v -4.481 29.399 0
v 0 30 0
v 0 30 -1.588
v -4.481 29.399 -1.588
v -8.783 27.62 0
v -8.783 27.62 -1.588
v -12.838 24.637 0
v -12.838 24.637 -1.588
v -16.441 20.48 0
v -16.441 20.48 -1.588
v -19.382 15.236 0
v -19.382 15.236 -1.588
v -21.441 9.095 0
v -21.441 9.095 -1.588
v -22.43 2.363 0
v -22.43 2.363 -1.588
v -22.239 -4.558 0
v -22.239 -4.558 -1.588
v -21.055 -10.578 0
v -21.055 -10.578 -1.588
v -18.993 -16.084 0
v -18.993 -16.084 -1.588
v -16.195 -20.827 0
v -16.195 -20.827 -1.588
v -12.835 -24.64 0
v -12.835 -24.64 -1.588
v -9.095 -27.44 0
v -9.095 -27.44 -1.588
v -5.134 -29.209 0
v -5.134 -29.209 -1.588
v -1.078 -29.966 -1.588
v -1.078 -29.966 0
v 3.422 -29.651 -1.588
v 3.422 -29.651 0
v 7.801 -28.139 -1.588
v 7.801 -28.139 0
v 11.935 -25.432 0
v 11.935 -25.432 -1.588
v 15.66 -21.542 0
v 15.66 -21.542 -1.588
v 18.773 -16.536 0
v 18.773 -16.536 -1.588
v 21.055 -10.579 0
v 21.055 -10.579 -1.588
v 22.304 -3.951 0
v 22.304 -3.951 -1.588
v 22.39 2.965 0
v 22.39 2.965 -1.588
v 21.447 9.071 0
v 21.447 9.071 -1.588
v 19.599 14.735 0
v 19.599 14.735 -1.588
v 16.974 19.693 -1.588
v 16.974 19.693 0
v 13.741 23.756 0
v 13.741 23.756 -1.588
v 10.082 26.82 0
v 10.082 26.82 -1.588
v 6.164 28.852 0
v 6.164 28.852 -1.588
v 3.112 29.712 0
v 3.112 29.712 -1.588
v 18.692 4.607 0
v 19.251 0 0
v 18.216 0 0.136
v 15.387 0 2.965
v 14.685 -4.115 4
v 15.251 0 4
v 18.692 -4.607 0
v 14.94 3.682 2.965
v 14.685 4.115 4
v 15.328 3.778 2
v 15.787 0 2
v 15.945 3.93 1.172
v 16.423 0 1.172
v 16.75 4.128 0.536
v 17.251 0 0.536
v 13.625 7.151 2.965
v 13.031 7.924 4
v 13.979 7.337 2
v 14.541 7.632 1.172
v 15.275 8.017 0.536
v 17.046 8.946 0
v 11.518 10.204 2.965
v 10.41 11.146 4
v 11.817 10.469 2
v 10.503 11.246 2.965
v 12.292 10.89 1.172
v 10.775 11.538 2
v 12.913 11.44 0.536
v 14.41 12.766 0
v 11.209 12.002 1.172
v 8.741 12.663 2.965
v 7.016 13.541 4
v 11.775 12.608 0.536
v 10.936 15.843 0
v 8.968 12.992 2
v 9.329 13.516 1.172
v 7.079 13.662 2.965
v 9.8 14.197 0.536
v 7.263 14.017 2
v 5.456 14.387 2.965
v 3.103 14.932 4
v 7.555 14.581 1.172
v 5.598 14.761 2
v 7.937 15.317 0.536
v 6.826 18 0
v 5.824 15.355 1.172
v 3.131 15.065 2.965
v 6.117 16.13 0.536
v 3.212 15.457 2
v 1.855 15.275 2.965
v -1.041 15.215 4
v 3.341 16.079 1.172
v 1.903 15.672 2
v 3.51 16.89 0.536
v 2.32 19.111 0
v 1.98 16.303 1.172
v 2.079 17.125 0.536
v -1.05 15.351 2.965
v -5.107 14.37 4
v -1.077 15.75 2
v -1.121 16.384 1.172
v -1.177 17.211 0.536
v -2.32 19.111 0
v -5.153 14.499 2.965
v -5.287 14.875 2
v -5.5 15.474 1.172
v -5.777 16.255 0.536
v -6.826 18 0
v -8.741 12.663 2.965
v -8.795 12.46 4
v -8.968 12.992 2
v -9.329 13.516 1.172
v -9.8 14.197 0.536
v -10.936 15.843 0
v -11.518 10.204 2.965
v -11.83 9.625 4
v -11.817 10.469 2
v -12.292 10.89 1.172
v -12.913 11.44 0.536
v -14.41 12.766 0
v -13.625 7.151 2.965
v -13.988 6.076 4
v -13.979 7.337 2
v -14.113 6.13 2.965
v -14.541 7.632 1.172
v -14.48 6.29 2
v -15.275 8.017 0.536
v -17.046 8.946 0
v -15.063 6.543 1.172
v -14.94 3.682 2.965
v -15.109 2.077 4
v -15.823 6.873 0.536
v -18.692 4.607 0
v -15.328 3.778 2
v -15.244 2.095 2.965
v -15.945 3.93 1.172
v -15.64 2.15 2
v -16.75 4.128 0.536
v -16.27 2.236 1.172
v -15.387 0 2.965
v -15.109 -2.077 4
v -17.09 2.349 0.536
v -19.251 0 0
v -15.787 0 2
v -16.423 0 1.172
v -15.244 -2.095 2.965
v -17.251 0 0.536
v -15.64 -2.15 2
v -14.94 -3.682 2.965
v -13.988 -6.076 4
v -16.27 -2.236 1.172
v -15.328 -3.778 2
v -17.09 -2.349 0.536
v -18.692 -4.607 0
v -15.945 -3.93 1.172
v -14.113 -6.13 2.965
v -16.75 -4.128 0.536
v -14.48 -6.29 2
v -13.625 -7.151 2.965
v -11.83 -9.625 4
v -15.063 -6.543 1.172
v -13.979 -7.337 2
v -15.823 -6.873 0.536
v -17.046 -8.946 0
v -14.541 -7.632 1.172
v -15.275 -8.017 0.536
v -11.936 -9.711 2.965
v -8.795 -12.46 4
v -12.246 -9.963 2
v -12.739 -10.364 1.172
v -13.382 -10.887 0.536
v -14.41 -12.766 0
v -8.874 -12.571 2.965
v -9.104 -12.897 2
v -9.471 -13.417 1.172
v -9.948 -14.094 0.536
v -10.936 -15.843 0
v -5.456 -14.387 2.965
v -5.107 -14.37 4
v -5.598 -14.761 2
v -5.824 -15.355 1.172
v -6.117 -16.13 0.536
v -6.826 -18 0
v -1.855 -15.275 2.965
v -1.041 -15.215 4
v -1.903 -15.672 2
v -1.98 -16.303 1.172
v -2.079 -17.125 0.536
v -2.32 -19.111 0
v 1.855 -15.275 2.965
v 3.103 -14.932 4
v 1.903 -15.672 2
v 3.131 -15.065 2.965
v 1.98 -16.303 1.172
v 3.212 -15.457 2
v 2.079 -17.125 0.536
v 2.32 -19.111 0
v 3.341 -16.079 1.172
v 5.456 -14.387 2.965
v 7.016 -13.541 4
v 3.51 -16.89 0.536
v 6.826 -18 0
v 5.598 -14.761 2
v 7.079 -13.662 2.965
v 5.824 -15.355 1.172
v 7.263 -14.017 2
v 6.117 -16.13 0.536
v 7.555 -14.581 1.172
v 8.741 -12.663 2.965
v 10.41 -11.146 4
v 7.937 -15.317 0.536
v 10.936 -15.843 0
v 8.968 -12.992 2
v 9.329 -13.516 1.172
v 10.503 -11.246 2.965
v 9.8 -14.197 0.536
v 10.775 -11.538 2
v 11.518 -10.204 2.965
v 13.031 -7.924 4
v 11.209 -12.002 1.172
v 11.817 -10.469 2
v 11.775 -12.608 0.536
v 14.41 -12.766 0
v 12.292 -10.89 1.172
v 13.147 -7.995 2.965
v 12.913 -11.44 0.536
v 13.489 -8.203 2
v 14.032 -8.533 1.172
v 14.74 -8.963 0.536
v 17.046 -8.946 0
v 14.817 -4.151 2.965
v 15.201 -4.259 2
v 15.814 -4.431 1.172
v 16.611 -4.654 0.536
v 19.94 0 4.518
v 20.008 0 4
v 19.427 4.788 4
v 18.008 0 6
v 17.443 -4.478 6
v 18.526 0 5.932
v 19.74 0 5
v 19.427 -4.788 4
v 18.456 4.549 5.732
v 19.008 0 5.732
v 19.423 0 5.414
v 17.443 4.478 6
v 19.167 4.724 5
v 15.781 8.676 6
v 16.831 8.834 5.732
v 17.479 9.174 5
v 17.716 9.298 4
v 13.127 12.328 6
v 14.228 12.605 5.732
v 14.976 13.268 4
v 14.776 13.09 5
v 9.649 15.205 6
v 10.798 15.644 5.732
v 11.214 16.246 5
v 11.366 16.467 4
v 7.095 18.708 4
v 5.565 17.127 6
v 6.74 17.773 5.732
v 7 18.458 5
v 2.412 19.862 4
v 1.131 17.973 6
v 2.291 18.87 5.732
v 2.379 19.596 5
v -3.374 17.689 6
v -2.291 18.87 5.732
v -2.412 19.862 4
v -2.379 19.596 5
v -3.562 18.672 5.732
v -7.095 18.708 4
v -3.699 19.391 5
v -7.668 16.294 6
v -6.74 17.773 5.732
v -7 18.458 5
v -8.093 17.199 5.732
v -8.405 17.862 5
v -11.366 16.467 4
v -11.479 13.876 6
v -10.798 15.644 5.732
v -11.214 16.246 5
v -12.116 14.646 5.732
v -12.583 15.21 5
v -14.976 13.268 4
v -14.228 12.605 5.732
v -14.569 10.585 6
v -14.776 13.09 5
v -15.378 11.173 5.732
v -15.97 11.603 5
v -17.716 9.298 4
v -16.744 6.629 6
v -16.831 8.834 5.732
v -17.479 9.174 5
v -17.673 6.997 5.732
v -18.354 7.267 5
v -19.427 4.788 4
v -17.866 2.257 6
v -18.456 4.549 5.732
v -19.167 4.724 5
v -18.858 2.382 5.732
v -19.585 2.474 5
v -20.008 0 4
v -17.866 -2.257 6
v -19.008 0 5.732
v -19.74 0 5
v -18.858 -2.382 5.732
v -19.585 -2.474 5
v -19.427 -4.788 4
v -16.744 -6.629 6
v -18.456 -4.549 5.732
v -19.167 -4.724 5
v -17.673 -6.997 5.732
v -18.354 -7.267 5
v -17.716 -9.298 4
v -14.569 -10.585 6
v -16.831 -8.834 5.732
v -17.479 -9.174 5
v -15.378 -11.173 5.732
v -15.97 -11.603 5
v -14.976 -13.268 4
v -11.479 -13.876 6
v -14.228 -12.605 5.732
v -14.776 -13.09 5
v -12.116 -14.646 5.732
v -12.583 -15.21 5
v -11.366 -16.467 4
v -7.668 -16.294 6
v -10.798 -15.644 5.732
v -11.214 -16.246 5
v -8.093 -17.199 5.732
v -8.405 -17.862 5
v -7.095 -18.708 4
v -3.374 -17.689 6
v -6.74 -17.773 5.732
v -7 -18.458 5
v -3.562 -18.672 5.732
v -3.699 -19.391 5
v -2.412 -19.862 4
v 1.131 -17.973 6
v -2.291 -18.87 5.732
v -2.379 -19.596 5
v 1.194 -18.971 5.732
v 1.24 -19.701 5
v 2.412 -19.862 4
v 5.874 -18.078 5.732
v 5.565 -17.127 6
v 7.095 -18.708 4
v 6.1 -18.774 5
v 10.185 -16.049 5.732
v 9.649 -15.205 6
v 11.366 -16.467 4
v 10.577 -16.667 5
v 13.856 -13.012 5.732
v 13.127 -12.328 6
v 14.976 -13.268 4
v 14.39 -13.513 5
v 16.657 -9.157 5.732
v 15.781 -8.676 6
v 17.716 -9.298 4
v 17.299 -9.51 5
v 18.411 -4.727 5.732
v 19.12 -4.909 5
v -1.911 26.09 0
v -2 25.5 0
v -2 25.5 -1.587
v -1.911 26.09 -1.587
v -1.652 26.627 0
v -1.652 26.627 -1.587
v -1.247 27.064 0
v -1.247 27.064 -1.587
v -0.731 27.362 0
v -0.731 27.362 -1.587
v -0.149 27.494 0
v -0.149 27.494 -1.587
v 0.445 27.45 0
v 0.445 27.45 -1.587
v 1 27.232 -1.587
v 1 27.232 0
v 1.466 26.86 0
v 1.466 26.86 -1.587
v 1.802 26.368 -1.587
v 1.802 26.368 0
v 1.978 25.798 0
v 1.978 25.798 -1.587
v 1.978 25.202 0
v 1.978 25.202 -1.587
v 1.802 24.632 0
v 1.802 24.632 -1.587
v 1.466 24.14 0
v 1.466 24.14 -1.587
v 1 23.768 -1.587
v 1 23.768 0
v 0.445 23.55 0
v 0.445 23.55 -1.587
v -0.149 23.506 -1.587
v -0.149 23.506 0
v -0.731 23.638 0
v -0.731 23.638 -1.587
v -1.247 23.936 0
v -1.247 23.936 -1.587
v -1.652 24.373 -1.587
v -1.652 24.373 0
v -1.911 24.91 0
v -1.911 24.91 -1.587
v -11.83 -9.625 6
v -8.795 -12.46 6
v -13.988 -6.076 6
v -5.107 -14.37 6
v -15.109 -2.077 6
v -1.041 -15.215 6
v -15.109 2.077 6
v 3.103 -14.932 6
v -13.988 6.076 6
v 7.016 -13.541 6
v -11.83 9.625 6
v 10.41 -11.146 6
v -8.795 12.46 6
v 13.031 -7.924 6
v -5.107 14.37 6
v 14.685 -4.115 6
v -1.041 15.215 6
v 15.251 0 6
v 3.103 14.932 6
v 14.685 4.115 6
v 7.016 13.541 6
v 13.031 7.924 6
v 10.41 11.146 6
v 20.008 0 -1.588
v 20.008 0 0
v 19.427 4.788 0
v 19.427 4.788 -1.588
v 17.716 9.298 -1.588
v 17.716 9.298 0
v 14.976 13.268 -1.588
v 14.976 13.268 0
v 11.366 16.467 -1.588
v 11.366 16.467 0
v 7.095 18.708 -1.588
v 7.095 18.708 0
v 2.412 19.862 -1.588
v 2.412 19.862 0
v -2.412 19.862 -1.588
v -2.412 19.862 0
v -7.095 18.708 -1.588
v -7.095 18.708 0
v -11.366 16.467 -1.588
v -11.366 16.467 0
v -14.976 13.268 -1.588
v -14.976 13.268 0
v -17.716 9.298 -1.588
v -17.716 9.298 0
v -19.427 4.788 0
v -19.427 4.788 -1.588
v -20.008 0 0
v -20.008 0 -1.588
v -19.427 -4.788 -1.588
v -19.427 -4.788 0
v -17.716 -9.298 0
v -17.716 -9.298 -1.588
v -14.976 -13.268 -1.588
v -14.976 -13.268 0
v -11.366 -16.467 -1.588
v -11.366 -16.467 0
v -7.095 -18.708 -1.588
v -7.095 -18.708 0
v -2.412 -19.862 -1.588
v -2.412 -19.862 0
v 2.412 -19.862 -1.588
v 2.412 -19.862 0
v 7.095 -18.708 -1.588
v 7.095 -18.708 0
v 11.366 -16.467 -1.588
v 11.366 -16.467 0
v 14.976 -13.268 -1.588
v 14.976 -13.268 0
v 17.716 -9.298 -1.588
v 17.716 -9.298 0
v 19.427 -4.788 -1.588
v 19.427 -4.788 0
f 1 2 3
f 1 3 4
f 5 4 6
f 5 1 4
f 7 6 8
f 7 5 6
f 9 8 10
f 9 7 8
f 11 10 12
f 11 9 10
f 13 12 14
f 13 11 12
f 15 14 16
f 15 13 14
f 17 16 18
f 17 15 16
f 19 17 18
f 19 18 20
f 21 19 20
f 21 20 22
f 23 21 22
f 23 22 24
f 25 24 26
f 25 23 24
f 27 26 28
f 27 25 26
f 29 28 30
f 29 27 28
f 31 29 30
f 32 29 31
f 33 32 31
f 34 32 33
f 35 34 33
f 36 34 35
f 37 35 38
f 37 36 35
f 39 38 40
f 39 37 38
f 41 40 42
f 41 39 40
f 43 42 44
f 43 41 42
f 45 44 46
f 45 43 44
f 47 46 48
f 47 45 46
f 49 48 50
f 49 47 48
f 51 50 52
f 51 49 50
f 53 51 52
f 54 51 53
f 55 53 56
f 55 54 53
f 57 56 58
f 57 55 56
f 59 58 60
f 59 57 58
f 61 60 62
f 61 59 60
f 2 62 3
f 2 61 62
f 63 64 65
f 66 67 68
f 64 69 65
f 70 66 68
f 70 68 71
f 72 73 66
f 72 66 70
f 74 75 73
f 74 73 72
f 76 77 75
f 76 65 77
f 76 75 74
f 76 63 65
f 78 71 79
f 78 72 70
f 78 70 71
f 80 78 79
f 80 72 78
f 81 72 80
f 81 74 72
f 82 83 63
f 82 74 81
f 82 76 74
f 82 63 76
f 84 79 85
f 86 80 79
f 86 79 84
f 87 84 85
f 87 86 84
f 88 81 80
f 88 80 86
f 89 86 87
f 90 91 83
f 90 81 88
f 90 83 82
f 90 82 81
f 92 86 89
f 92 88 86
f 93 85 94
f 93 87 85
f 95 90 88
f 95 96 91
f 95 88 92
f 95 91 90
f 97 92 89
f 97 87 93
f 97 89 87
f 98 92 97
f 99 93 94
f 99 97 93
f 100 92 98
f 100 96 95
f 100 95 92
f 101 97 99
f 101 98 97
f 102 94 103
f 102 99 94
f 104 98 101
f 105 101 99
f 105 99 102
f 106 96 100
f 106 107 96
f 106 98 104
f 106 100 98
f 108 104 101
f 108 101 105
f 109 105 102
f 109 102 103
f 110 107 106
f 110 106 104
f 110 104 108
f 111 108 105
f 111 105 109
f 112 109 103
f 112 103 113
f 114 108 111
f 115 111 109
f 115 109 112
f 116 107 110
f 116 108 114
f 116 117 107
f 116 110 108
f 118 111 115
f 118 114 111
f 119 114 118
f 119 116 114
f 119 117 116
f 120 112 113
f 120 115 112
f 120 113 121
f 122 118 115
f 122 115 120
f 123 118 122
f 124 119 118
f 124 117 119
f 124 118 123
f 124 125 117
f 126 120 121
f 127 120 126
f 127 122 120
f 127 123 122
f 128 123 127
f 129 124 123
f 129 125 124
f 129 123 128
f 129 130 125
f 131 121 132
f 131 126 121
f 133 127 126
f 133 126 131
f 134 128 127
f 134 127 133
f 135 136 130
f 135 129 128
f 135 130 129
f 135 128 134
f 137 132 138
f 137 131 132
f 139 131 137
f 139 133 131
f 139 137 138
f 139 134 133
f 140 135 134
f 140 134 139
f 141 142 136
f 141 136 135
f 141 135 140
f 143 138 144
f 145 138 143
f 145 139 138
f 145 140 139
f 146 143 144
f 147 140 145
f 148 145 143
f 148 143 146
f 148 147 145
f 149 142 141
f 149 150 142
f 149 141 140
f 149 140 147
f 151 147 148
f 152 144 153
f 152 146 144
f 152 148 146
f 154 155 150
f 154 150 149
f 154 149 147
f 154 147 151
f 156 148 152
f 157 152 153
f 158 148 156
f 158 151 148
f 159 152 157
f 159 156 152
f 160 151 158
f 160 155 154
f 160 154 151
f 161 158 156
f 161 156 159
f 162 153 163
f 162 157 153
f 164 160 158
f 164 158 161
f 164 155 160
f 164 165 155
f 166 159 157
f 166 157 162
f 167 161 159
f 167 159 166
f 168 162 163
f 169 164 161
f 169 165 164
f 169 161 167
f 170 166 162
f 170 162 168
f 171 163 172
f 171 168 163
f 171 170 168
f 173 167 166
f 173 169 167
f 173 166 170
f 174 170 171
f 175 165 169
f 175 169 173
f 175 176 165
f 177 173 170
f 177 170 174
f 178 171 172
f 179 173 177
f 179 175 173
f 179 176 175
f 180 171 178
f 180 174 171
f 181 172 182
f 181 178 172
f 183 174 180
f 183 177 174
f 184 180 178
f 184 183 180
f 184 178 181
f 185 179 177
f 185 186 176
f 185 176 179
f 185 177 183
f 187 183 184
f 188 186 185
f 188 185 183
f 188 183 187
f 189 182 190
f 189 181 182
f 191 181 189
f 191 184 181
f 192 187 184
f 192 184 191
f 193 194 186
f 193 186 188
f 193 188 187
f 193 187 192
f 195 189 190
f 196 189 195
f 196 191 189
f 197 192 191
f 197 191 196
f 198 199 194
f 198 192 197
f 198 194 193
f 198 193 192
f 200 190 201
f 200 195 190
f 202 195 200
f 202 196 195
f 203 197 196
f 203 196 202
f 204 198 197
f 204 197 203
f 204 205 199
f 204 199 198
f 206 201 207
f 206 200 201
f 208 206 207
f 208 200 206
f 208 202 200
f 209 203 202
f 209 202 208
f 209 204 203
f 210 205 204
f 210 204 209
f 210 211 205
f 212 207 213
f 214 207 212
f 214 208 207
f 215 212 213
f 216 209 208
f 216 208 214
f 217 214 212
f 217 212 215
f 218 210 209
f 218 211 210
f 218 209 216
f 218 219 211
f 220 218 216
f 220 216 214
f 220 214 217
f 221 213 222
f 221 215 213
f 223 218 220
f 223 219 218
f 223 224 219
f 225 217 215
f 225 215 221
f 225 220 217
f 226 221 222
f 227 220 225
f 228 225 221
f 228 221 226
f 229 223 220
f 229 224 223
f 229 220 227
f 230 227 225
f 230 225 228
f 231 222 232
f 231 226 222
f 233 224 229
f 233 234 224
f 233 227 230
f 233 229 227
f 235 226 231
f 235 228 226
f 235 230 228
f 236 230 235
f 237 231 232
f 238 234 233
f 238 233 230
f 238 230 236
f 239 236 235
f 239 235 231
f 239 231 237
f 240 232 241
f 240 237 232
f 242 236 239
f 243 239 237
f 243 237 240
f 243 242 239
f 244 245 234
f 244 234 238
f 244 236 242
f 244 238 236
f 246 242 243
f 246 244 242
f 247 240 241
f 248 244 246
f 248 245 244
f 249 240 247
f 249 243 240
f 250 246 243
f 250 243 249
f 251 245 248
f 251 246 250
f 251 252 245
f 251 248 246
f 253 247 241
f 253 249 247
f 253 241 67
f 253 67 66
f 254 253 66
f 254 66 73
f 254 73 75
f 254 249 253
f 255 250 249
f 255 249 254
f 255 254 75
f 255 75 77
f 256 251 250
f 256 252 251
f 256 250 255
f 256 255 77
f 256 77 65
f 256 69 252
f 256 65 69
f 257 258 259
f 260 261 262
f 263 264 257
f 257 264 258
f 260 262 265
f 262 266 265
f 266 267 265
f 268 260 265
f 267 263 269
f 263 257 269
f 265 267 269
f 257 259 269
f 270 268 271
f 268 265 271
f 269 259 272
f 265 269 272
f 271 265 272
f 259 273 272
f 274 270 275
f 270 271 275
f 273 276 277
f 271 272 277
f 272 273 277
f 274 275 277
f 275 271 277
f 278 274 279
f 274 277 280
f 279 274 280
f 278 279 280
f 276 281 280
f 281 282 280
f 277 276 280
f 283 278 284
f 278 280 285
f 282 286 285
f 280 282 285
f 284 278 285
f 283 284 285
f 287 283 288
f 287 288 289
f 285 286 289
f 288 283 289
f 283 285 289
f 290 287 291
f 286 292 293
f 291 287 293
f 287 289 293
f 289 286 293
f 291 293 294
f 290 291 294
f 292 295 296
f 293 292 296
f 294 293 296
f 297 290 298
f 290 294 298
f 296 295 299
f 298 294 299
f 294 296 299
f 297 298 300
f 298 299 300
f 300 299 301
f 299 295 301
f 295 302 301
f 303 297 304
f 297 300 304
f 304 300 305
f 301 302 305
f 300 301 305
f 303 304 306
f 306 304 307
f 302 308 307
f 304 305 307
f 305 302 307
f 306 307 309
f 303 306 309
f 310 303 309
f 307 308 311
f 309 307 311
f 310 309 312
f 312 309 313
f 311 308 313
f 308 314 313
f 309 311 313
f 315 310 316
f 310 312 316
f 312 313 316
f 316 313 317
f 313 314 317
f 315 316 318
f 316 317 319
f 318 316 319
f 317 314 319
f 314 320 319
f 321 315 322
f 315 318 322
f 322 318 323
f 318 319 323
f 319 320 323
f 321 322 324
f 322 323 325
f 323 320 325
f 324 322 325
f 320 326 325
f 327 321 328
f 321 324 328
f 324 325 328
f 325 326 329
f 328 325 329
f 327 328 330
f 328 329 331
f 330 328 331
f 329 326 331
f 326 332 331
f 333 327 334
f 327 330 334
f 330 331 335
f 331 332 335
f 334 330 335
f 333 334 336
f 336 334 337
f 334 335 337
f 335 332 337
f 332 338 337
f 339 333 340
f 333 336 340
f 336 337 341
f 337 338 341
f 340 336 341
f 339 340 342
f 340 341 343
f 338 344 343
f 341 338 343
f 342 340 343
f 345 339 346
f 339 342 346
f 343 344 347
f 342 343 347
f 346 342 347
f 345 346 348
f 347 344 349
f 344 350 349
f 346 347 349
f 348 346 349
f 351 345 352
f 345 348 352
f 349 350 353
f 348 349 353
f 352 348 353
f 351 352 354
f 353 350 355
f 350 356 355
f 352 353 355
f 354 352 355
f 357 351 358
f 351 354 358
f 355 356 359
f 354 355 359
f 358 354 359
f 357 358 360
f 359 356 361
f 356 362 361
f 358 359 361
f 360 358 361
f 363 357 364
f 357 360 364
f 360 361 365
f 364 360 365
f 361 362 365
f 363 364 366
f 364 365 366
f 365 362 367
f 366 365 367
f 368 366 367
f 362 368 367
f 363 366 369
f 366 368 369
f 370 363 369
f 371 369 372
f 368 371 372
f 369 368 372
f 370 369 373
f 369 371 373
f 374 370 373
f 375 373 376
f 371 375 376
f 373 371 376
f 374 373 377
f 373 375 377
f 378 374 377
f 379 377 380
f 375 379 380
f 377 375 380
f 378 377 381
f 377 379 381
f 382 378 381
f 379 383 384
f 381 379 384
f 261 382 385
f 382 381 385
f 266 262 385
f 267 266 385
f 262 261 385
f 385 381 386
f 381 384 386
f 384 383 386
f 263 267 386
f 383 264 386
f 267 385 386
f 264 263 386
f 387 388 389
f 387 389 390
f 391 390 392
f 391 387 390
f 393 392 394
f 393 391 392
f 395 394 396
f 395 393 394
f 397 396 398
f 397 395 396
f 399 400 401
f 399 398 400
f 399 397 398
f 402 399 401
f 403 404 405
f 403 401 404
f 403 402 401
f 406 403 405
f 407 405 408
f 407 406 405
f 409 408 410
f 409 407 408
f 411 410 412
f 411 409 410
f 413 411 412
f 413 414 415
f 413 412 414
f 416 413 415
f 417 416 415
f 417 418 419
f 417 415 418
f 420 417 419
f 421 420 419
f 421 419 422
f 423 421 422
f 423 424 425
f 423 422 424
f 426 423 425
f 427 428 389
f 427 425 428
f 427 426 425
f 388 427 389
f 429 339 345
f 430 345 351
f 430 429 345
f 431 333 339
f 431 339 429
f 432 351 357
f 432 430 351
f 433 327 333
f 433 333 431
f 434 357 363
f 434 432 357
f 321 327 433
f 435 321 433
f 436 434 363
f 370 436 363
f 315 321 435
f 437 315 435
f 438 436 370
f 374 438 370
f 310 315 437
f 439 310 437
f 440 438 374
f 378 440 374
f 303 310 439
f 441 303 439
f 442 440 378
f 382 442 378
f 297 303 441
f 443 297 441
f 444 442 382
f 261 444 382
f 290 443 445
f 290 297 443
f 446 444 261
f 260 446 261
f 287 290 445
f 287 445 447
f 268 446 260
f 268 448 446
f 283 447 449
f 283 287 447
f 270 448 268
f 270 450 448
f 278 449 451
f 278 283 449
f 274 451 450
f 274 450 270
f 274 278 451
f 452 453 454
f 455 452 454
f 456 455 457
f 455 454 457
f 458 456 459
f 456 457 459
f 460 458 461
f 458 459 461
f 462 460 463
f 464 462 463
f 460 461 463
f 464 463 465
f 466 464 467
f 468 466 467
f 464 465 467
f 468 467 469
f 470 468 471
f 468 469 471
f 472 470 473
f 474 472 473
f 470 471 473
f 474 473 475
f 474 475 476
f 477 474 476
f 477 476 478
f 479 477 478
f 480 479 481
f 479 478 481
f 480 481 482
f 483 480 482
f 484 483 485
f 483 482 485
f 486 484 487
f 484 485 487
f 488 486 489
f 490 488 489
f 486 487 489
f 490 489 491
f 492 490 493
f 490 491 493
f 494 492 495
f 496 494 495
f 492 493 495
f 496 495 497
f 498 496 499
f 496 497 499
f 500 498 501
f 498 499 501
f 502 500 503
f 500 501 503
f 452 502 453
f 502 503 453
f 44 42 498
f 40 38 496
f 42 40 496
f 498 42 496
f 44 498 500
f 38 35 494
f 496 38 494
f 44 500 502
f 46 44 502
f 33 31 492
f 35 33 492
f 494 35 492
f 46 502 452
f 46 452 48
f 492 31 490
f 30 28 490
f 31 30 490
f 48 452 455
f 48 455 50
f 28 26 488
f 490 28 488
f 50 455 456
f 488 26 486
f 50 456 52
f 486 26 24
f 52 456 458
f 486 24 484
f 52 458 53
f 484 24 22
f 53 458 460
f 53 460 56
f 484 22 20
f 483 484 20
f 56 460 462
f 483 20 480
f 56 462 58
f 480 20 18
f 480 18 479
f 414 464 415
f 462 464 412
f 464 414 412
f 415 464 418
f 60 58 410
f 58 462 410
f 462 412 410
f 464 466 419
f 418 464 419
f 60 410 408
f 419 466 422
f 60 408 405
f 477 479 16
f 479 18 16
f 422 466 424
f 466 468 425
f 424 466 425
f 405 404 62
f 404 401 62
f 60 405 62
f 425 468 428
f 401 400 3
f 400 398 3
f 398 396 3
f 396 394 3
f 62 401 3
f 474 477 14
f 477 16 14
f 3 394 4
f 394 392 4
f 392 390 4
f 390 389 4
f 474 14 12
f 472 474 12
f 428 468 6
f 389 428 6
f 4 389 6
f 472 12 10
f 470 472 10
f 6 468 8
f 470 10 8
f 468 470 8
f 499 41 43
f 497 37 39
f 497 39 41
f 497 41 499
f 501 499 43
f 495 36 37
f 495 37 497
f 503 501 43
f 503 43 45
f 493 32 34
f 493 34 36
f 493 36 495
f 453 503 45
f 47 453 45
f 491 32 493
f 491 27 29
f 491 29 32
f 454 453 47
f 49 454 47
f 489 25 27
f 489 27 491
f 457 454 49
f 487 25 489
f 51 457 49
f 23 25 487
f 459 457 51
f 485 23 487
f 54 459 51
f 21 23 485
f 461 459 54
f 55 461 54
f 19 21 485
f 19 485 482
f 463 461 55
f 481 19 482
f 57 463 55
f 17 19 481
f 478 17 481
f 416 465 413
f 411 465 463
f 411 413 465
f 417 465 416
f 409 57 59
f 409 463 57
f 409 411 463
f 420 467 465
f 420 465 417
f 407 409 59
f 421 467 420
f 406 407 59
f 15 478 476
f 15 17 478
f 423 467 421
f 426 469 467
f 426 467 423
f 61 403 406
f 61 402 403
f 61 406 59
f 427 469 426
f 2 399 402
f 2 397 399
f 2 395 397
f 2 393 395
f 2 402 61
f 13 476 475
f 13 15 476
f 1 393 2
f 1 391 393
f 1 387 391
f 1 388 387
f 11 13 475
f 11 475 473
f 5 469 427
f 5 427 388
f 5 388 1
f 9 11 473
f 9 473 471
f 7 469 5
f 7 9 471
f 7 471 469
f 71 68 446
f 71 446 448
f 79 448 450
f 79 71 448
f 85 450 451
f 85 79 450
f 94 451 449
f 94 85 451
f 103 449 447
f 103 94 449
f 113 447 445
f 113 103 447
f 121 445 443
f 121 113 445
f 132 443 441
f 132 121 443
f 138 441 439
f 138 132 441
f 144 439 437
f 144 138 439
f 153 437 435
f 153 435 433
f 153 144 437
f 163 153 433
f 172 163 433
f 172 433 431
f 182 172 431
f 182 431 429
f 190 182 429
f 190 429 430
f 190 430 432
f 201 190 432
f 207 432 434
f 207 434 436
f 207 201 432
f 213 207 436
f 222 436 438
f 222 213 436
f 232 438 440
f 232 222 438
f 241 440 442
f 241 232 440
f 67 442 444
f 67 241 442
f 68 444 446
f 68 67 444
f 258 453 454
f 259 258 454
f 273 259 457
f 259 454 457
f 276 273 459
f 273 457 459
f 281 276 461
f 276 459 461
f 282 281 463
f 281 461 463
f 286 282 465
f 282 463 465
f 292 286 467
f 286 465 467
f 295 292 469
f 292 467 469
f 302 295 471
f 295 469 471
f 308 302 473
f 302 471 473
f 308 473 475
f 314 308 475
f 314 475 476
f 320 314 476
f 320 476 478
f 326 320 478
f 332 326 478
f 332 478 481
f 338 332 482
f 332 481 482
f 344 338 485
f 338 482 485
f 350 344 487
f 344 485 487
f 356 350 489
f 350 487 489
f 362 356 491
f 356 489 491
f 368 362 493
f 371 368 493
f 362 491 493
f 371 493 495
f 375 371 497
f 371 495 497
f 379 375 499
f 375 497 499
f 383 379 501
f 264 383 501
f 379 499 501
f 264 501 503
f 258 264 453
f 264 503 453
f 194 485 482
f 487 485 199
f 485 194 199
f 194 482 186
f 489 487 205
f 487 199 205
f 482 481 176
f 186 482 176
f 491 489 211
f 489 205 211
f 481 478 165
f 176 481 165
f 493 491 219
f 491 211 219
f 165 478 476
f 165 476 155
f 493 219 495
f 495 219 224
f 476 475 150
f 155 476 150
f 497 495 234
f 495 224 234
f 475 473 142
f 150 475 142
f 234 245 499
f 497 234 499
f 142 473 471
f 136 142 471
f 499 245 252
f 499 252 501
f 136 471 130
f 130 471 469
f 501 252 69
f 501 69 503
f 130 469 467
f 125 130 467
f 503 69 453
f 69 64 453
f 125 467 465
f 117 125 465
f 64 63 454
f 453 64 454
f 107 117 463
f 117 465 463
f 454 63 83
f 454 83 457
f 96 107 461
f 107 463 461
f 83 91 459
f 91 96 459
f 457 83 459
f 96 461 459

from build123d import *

# Parameters (mm, degrees)
SKETCH1_RX              = 30
SKETCH1_RY              = 22.5
SKETCH1_R               = 20.008311299
BOSS_EXTRUDE1_DEPTH     = 1.5875
SKETCH1_3_R             = 20.008311299
SKETCH1_3_R_2           = 15.25098722
BOSS_EXTRUDE2_DEPTH     = 6
FILLET1_R               = 4
FILLET2_R               = 2
CUT_EXTRUDE1_DEPTH      = 39.259902741
CUT_EXTRUDE1_DEPTH_BACK = 39.259902741
SKETCH3_R               = 2


with BuildPart() as part:
    # Sketch1 → Boss-Extrude1 (new body)
    with BuildSketch(Plane.XY):
        with Locations(Location((0, 0), (0, 0, 90))):
            Ellipse(SKETCH1_RX, SKETCH1_RY)
        Circle(SKETCH1_R, mode=Mode.SUBTRACT)
    extrude(amount=-BOSS_EXTRUDE1_DEPTH)

    # Sketch3 → Cut-Extrude1 (cut, two sides: drawn at the far end of the back side and taken through both)
    with BuildSketch(Plane(origin=(0, 0, -1.5875), x_dir=(-1, 0, 0), z_dir=(0, 0, -1)).offset(-CUT_EXTRUDE1_DEPTH_BACK)):
        with Locations((0, 25.5)):
            Circle(SKETCH3_R)
    extrude(amount=CUT_EXTRUDE1_DEPTH + CUT_EXTRUDE1_DEPTH_BACK, mode=Mode.SUBTRACT)


with BuildPart() as body_2:
    # Sketch1<3> → Boss-Extrude2 (new body)
    with BuildSketch(Plane.XY):
        Circle(SKETCH1_3_R)
        Circle(SKETCH1_3_R_2, mode=Mode.SUBTRACT)
    extrude(amount=BOSS_EXTRUDE2_DEPTH)

    # Fillet1
    fillet1_edges = [body_2.edges().sort_by_distance(p)[0] for p in [
        (-15.25098722, 0, 0),
    ]]
    fillet(fillet1_edges, radius=FILLET1_R)

    # Fillet2
    fillet2_edges = [body_2.edges().sort_by_distance(p)[0] for p in [
        (-20.008311299, 0, 6),
    ]]
    fillet(fillet2_edges, radius=FILLET2_R)


solid = Compound([part.part, body_2.part])
